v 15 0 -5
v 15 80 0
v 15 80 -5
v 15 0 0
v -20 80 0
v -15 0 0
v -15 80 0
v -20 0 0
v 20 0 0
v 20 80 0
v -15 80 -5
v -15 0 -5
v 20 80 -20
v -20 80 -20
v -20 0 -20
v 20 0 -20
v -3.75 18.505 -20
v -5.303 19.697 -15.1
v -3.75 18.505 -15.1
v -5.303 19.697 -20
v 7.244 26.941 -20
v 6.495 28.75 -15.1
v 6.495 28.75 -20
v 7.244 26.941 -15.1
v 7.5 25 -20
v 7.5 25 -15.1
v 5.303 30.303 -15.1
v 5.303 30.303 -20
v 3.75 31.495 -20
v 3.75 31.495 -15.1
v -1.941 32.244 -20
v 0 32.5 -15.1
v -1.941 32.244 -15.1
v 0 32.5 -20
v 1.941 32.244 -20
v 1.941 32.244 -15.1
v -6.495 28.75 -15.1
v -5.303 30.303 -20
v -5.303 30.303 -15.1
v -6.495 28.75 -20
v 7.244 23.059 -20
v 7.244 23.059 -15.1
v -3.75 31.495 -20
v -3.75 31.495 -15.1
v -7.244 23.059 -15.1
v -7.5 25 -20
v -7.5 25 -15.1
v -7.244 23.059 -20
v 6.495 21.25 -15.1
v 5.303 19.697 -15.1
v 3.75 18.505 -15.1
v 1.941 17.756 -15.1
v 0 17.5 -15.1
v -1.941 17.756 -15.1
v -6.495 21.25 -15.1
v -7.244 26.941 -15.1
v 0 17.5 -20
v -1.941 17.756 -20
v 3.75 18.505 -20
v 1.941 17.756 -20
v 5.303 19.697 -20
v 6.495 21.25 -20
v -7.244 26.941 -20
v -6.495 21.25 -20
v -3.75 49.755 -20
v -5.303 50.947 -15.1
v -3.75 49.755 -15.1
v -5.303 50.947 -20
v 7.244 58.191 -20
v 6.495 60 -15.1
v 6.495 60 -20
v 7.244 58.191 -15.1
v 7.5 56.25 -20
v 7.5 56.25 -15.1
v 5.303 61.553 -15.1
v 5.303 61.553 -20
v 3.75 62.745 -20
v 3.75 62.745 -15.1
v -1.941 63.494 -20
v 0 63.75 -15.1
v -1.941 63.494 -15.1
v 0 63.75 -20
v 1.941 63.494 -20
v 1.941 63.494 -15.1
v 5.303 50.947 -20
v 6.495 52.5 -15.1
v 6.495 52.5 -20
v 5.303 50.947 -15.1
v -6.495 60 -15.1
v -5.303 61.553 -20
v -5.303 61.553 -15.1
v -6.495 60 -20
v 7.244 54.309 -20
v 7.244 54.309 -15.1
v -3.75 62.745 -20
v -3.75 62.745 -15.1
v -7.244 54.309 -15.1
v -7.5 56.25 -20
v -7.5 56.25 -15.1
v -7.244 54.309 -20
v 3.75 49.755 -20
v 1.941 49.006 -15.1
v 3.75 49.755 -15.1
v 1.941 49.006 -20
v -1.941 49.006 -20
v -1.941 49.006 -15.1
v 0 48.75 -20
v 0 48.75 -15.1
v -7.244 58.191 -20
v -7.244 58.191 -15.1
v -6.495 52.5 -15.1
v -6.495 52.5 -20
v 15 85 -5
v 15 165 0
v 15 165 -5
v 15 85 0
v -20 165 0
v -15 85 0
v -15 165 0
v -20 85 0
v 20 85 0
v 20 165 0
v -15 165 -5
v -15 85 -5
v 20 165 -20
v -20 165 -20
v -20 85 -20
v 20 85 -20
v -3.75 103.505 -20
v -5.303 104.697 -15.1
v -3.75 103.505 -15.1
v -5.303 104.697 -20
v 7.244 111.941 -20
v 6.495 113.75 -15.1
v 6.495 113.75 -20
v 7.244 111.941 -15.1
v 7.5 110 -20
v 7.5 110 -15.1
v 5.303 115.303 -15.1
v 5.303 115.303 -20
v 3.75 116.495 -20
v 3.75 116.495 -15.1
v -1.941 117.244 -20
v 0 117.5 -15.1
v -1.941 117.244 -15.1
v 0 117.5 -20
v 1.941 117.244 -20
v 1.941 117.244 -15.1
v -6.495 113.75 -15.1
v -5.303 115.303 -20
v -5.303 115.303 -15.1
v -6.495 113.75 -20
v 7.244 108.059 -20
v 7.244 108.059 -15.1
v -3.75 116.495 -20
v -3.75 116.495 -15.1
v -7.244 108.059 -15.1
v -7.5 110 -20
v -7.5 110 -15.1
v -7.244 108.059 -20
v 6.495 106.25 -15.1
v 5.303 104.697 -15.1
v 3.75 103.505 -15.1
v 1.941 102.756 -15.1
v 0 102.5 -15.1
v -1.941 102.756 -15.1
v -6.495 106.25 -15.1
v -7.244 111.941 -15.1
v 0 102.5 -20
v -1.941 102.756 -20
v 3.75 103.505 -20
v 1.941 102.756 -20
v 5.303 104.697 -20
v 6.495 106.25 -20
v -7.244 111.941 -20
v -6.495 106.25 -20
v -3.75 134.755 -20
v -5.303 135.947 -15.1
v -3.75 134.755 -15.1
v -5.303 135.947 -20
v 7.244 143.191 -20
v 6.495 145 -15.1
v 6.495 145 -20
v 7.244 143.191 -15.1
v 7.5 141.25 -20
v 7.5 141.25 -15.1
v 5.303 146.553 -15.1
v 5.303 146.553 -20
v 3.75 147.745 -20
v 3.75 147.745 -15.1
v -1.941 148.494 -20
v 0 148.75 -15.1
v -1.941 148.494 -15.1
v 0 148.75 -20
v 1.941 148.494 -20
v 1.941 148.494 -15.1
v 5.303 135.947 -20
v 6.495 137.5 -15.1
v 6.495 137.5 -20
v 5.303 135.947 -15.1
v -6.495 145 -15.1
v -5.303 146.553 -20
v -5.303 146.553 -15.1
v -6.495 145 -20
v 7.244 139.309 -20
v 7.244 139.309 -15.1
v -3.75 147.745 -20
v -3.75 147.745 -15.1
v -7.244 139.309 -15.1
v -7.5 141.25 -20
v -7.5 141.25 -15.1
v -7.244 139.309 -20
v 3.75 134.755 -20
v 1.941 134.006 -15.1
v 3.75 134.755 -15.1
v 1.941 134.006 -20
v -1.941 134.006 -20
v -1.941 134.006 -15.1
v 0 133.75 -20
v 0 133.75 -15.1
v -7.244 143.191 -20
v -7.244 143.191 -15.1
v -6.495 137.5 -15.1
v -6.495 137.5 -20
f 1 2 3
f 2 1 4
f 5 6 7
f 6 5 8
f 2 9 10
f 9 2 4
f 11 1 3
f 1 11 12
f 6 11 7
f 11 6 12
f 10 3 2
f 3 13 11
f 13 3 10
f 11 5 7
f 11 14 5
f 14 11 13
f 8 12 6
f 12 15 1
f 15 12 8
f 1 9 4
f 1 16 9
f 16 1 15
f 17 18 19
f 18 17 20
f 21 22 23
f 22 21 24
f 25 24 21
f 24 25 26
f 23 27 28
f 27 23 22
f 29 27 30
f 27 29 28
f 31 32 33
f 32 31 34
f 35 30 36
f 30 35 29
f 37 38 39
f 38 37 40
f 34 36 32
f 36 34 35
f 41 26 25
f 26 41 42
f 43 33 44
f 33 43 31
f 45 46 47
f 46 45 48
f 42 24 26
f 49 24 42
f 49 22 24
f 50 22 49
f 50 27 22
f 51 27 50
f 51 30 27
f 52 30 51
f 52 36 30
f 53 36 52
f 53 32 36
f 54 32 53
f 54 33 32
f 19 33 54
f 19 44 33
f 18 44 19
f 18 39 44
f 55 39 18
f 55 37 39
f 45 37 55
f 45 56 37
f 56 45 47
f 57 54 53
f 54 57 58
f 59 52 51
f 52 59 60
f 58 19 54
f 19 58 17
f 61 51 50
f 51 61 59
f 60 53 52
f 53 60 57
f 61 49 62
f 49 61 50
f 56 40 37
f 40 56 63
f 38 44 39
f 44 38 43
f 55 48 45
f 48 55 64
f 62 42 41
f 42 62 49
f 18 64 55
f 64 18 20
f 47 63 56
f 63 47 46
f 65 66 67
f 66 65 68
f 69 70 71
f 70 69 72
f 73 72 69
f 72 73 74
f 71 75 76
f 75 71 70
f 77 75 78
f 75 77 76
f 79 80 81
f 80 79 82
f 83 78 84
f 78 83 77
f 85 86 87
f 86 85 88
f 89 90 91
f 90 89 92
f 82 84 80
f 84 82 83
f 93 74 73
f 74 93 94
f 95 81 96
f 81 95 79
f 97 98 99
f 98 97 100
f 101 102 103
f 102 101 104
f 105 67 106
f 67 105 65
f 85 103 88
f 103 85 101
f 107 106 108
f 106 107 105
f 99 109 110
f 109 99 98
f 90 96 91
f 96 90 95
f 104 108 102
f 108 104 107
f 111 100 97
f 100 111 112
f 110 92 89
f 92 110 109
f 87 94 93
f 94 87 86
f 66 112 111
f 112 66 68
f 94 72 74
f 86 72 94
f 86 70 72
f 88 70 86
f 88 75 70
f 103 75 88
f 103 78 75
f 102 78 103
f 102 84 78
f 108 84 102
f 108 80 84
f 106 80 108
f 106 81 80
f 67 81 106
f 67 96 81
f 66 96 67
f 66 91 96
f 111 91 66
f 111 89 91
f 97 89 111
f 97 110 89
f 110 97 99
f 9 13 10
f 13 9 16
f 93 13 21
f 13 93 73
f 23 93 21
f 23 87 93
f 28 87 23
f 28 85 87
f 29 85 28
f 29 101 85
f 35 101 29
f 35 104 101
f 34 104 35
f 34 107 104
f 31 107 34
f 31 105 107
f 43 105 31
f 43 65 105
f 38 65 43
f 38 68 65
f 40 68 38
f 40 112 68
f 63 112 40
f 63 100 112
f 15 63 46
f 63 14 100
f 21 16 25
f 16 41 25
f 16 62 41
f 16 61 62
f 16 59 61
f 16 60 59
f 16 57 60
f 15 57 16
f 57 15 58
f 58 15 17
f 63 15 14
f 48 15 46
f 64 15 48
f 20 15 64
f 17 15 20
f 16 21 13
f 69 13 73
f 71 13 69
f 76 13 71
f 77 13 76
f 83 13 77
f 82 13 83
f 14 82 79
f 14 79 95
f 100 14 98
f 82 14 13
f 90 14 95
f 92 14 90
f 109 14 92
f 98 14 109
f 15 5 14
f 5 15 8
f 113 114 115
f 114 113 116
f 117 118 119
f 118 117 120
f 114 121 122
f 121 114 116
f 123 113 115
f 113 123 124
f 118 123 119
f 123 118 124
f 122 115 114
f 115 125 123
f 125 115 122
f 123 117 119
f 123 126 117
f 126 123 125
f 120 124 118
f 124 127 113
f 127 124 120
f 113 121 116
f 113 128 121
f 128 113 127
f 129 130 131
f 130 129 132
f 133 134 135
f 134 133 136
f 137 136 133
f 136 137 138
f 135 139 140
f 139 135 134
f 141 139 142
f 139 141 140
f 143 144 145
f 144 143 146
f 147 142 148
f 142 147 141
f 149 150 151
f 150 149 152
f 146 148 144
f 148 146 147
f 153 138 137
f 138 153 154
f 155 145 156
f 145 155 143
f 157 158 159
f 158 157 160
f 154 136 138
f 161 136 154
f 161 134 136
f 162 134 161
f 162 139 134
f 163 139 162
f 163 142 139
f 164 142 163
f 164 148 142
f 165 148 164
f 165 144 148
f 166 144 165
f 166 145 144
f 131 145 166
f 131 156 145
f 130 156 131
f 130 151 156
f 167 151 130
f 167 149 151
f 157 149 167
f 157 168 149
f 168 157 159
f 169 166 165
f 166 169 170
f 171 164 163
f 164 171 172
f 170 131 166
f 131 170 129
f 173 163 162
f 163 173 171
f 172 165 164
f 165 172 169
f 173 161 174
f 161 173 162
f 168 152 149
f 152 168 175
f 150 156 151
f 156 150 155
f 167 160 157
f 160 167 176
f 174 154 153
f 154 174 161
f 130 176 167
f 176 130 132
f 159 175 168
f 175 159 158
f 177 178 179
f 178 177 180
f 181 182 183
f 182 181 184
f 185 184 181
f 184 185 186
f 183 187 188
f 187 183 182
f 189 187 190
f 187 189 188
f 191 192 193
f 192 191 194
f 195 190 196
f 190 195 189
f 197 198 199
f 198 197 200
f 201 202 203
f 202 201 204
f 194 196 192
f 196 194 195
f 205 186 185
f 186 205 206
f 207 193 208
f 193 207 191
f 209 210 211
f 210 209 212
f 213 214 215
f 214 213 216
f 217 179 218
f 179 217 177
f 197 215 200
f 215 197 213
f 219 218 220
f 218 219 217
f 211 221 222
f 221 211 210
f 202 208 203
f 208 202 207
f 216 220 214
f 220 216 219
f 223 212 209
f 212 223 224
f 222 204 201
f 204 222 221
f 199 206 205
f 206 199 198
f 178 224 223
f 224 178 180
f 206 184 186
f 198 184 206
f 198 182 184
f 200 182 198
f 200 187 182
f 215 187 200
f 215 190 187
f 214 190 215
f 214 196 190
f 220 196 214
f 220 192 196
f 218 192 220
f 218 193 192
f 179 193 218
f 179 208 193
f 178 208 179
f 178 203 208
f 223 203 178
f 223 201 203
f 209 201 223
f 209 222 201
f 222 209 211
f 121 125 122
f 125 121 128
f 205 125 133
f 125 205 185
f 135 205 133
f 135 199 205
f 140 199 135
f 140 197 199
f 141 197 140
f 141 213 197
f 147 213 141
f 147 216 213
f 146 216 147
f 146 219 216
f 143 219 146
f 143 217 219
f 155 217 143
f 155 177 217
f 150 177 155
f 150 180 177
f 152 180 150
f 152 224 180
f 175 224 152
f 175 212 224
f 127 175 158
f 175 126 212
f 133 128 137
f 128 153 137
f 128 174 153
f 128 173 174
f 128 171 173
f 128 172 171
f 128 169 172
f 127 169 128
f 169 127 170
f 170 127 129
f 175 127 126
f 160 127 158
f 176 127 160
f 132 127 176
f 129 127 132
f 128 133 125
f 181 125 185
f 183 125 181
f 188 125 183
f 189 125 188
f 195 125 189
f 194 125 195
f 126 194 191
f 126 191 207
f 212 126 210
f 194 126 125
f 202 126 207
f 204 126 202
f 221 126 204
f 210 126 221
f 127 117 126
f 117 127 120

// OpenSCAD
module mainboxsocket(thickness=5, height=30, length=175, width=75,pin_dia=30){
    pin_height=5;
        
    //color("Salmon") translate([0,length*1/3,-0.5*pin_height-height+pin_height-0.1]) cylinder(h=pin_height,d=pin_dia,center=true);
    difference(){
        color("Blue", alpha=0.5) translate([0,(length+thickness)/2,-1*height/2]) cube([width+2*thickness,length+thickness,height],center=true);
        union(){
            color("Red") translate([0,length/2,-thickness/2]) cube([width,length,thickness],center=true);
            color("Salmon") translate([0,length*1/3,-0.5*pin_height-height+pin_height-0.1]) cylinder(h=pin_height,d=pin_dia,center=true);
            color("Salmon") translate([0,length*3/4,-0.5*pin_height-height+pin_height-0.1]) cylinder(h=pin_height,d=pin_dia,center=true);
            
            }//uni
        }//diff
    }//module


module mainbox(thickness=5, height=30, length=175, width=75,pin_dia=30){
    pin_height=3;
        
    //color("Salmon") translate([0,length*1/3,-0.5*pin_height-height+pin_height-0.1]) cylinder(h=pin_height,d=pin_dia,center=true);
    color("Navy") translate([0,length*1/3,0.5*pin_height+0*height+0*pin_height-0.1]) cylinder(h=pin_height,d=pin_dia*0.9,center=true);
    color("Navy") translate([0,length*3/4,0.5*pin_height+0*height+0*pin_height-0.1]) cylinder(h=pin_height,d=pin_dia*0.9,center=true);

    difference(){
        color("Blue", alpha=0.5) translate([0,(length+thickness)/2,-1*height/2]) cube([width+2*thickness,length+thickness,height],center=true);
        union(){
            color("Salmon") translate([0,length*1/3,-0.5*pin_height-height+pin_height-0.1]) cylinder(h=pin_height,d=pin_dia,center=true);
            color("Salmon") translate([0,length*3/4,-0.5*pin_height-height+pin_height-0.1]) cylinder(h=pin_height,d=pin_dia,center=true);
            
            }//uni
        }//diff
    }//module
    
module mainboxsocket_pruchozi(thickness=5, height=30, length=175, width=75,pin_dia=30){
    pin_height=5;
        
    //color("Salmon") translate([0,length*1/3,-0.5*pin_height-height+pin_height-0.1]) cylinder(h=pin_height,d=pin_dia,center=true);
    difference(){
        color("Blue", alpha=0.5) translate([0,(length+thickness)/2,-1*height/2]) cube([width+2*thickness,length+thickness,height],center=true);
        union(){
            color("Red") translate([0,thickness/2+length/2,-thickness/2]) cube([width,thickness+length,thickness],center=true);
            color("Salmon") translate([0,length*1/3,-0.5*pin_height-height+pin_height-0.1]) cylinder(h=pin_height,d=pin_dia,center=true);
            color("Salmon") translate([0,length*3/4,-0.5*pin_height-height+pin_height-0.1]) cylinder(h=pin_height,d=pin_dia,center=true);
            
            }//uni
        }//diff
    }//module
    
vyska=20;
mainboxsocket_pruchozi(height=vyska, length=75, width=30,pin_dia=15);
translate ([0,85,0]) mainboxsocket_pruchozi(height=vyska, length=75, width=30,pin_dia=15);

/*
vyska=20;
mainboxsocket(height=vyska);
translate ([70,0,0]) mainboxsocket(height=vyska, length=75, width=30,pin_dia=15);
translate ([-70,0,0]) mainboxsocket(height=vyska, length=75, width=30, pin_dia=15);
*/

/*
vyska=40;
mainbox(height=vyska);
translate ([70,0,0]) mainbox(height=vyska, length=75, width=30,pin_dia=15);
translate ([-70,0,0]) mainbox(height=vyska, length=75, width=30, pin_dia=15);
    
 */
